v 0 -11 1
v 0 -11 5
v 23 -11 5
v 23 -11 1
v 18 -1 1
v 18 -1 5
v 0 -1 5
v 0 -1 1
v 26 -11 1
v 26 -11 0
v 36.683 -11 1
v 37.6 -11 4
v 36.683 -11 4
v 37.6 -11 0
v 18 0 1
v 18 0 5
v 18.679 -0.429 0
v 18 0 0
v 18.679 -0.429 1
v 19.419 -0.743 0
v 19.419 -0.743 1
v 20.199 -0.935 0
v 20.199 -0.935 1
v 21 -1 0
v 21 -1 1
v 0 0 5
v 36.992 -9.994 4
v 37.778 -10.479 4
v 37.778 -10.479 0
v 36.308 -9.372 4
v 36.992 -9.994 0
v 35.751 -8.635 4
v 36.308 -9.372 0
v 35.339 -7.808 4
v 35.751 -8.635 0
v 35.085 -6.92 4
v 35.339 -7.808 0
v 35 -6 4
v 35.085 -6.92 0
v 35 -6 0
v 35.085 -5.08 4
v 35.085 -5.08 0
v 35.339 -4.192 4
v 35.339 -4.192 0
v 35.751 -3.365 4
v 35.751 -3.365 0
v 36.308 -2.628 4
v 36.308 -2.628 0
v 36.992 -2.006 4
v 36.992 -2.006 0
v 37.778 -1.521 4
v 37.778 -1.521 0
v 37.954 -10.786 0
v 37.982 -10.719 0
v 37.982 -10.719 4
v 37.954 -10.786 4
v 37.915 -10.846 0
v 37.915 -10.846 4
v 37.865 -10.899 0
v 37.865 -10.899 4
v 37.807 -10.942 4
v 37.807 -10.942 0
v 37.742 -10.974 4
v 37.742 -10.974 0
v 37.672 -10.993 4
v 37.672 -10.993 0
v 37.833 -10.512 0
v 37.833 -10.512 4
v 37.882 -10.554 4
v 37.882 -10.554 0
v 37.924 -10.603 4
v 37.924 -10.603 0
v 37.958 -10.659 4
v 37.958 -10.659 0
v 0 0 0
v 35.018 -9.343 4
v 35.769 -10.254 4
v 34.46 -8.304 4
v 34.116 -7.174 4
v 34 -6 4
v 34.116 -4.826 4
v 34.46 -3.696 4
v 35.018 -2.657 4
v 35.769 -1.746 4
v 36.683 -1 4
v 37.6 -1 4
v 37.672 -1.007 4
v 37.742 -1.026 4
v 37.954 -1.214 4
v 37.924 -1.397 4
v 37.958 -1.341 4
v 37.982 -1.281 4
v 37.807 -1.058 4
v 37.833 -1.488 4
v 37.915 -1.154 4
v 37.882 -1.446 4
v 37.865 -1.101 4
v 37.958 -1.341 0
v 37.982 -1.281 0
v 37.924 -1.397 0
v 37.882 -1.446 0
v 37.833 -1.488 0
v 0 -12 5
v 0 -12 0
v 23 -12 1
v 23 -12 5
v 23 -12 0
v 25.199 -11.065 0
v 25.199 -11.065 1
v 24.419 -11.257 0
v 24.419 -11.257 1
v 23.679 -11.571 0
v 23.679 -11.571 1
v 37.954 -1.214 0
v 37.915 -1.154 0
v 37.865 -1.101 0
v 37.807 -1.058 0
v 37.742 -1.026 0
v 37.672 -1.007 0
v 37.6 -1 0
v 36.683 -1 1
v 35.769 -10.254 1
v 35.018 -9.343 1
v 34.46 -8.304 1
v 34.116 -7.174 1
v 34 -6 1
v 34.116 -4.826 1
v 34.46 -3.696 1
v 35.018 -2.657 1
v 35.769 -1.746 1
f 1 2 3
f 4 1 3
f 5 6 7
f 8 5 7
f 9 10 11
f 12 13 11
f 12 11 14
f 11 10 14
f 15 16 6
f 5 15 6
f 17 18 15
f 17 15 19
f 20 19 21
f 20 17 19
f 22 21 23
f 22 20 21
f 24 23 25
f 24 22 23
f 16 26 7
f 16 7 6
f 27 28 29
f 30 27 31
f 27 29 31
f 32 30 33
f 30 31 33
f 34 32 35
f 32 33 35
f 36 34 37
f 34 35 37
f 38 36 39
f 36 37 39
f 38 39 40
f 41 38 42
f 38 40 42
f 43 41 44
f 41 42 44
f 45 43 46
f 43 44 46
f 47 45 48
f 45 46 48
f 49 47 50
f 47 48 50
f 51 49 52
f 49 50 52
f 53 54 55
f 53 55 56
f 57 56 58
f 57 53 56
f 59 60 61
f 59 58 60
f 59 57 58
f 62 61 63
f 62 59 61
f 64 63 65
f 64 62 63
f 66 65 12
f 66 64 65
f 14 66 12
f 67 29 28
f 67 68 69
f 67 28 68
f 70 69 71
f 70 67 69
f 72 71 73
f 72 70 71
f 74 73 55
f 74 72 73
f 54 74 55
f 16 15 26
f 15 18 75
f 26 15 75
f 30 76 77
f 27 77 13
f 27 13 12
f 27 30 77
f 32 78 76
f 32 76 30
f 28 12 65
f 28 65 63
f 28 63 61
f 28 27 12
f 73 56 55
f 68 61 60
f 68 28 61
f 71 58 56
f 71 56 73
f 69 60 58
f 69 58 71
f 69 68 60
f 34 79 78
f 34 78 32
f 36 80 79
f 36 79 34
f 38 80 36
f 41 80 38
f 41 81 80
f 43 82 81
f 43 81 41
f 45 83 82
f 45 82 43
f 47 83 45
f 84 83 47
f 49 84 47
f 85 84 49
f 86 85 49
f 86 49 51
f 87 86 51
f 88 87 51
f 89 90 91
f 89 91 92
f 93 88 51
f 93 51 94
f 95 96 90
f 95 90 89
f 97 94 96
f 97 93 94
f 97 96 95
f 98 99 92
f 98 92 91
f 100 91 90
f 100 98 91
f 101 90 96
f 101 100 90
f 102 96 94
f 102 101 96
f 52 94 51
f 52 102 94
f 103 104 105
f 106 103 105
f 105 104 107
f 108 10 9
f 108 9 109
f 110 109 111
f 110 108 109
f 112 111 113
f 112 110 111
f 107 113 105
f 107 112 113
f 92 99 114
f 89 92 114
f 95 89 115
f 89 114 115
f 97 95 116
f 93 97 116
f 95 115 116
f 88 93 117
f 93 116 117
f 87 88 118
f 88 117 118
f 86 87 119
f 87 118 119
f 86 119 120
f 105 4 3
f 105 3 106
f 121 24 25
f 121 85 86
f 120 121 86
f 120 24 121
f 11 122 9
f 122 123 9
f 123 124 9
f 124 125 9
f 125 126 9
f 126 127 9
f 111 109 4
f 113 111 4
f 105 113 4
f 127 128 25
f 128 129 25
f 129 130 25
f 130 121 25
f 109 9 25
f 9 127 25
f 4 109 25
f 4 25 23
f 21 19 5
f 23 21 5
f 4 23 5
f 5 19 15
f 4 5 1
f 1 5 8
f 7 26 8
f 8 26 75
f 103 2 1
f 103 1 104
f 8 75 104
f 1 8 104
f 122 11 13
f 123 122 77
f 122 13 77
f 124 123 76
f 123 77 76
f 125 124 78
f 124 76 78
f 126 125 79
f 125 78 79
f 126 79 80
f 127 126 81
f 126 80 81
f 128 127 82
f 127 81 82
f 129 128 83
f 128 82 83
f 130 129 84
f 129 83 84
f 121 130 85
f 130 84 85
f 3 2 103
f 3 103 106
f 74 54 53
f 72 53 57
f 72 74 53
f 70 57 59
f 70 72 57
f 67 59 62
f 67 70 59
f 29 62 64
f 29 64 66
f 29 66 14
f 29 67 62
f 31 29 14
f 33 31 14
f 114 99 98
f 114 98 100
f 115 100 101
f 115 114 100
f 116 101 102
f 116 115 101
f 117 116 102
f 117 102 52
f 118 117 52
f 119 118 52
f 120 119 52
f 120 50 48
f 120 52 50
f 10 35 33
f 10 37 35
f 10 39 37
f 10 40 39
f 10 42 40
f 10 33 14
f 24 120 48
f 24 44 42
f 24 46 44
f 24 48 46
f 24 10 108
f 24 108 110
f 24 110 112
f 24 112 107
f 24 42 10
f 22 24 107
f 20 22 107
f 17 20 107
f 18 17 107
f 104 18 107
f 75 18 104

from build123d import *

# Parameters (mm, degrees)
F1_DEPTH    = 5
F3_DEPTH    = 4
F4_W        = 15
F4_H        = 1
F4_W_2      = 20
F5_DEPTH    = 25
F6_T1_DEPTH = 6.2738947701
F6_T3_DEPTH = 7
F8_DEPTH    = 1
F9_T1_DEPTH = 1


# Not quite as in the source:
# - a fillet or chamfer that OpenCascade refuses, or shapes differently, is made with other operations: its cross-section is extruded or revolved along the edge and cut away or added


with BuildPart() as f1:
    # F0 (on Top) → F1 (new body)
    with BuildSketch(Plane.XY):
        with BuildLine():
            Line((38, 0), (0, 0))
            Line((0, 0), (0, -12))
            Line((0, -12), (38, -12))
            Line((38, -12), (38, -10.582575695))
            ThreePointArc((38, -10.582575695), (35, -6), (38, -1.417424305))
            Line((38, -1.417424305), (38, 0))
        make_face()
    extrude(amount=F1_DEPTH)

    # F2 (on face) → F3 (cut)
    with BuildSketch(Plane.XY.offset(5)):
        with BuildLine():
            ThreePointArc((38, -11.6568542495), (34, -6), (38, -0.3431457505))
            Line((38, -0.3431457505), (38, 0))
            Line((38, 0), (18, 0))
            Line((18, 0), (18, -1))
            Line((18, -1), (0, -1))
            Line((0, -1), (0, -11))
            Line((0, -11), (23, -11))
            Line((23, -11), (23, -12))
            Line((23, -12), (38, -12))
            Line((38, -12), (38, -11.6568542495))
        make_face()
    extrude(amount=-F3_DEPTH, mode=Mode.SUBTRACT)

    # F4 (on face) → F5 (cut)
    with BuildSketch(Plane(origin=(0, 0, 0), x_dir=(1, 0, 0), z_dir=(0, 0, -1))):
        with Locations((30.5, 11.5)):
            Rectangle(F4_W, F4_H)
        with Locations((28, 0.5)):
            Rectangle(F4_W_2, F4_H)
    extrude(amount=-F5_DEPTH, mode=Mode.SUBTRACT)

    # F6: fillet of radius 0.4 on 4 edges, made by hand

    # F6_s2 → F6_t1 (cut)
    with BuildSketch(Plane.XY.offset(-0.6369473851)):
        with BuildLine():
            ThreePointArc((37.7777777778, -10.4790320824), (37.9399346342, -10.6265361383), (38, -10.837354649))
            Line((38, -10.837354649), (38, -10.582575695))
            ThreePointArc((38, -10.582575695), (37.8882541717, -10.5321660998), (37.7777777778, -10.4790320824))
        make_face()
        with BuildLine():
            ThreePointArc((38, -1.162645351), (37.9399346342, -1.3734638617), (37.7777777778, -1.5209679176))
            ThreePointArc((37.7777777778, -1.5209679176), (37.8882541717, -1.4678339002), (38, -1.417424305))
            Line((38, -1.417424305), (38, -1.162645351))
        make_face()
    extrude(amount=F6_T1_DEPTH, mode=Mode.SUBTRACT)

    # F6_s4 → F6_t3 (cut)
    with BuildSketch(Plane.XY.offset(-1)):
        with BuildLine():
            ThreePointArc((38, -10.6), (37.8828427125, -10.8828427125), (37.6, -11))
            Line((37.6, -11), (38, -11))
            Line((38, -11), (38, -10.6))
        make_face()
        with BuildLine():
            ThreePointArc((38, -1.4), (37.8828427125, -1.1171572875), (37.6, -1))
            Line((37.6, -1), (38, -1))
            Line((38, -1), (38, -1.4))
        make_face()
    extrude(amount=F6_T3_DEPTH, mode=Mode.SUBTRACT)

    # F7 (on face) → F8 (cut)
    with BuildSketch(Plane.XY.offset(5)):
        with BuildLine():
            ThreePointArc((36.6833752096, -1), (34, -6), (36.6833752096, -11))
            Line((36.6833752096, -11), (37.6, -11))
            ThreePointArc((37.6, -11), (37.8372014652, -10.9220799045), (37.9819891264, -10.7186773245))
            ThreePointArc((37.9819891264, -10.7186773245), (37.9044539493, -10.5779171946), (37.7777777778, -10.4790320824))
            ThreePointArc((37.7777777778, -10.4790320824), (35, -6), (37.7777777778, -1.5209679176))
            ThreePointArc((37.7777777778, -1.5209679176), (37.9044539493, -1.4220828054), (37.9819891264, -1.2813226755))
            ThreePointArc((37.9819891264, -1.2813226755), (37.8372014652, -1.0779200955), (37.6, -1))
            Line((37.6, -1), (36.6833752096, -1))
        make_face()
    extrude(amount=-F8_DEPTH, mode=Mode.SUBTRACT)

    # F9: fillet of radius 5 on 2 edges, made by hand

    # F9_s2 → F9_t1 (join)
    with BuildSketch(Plane.XY):
        with BuildLine():
            ThreePointArc((18, 0), (19.4188611699, -0.7434164903), (21, -1))
            Line((21, -1), (18, -1))
            Line((18, -1), (18, 0))
        make_face()
        with BuildLine():
            ThreePointArc((26, -11), (24.4188611699, -11.2565835097), (23, -12))
            Line((23, -12), (23, -11))
            Line((23, -11), (26, -11))
        make_face()
    extrude(amount=F9_T1_DEPTH)


solid = f1.part
